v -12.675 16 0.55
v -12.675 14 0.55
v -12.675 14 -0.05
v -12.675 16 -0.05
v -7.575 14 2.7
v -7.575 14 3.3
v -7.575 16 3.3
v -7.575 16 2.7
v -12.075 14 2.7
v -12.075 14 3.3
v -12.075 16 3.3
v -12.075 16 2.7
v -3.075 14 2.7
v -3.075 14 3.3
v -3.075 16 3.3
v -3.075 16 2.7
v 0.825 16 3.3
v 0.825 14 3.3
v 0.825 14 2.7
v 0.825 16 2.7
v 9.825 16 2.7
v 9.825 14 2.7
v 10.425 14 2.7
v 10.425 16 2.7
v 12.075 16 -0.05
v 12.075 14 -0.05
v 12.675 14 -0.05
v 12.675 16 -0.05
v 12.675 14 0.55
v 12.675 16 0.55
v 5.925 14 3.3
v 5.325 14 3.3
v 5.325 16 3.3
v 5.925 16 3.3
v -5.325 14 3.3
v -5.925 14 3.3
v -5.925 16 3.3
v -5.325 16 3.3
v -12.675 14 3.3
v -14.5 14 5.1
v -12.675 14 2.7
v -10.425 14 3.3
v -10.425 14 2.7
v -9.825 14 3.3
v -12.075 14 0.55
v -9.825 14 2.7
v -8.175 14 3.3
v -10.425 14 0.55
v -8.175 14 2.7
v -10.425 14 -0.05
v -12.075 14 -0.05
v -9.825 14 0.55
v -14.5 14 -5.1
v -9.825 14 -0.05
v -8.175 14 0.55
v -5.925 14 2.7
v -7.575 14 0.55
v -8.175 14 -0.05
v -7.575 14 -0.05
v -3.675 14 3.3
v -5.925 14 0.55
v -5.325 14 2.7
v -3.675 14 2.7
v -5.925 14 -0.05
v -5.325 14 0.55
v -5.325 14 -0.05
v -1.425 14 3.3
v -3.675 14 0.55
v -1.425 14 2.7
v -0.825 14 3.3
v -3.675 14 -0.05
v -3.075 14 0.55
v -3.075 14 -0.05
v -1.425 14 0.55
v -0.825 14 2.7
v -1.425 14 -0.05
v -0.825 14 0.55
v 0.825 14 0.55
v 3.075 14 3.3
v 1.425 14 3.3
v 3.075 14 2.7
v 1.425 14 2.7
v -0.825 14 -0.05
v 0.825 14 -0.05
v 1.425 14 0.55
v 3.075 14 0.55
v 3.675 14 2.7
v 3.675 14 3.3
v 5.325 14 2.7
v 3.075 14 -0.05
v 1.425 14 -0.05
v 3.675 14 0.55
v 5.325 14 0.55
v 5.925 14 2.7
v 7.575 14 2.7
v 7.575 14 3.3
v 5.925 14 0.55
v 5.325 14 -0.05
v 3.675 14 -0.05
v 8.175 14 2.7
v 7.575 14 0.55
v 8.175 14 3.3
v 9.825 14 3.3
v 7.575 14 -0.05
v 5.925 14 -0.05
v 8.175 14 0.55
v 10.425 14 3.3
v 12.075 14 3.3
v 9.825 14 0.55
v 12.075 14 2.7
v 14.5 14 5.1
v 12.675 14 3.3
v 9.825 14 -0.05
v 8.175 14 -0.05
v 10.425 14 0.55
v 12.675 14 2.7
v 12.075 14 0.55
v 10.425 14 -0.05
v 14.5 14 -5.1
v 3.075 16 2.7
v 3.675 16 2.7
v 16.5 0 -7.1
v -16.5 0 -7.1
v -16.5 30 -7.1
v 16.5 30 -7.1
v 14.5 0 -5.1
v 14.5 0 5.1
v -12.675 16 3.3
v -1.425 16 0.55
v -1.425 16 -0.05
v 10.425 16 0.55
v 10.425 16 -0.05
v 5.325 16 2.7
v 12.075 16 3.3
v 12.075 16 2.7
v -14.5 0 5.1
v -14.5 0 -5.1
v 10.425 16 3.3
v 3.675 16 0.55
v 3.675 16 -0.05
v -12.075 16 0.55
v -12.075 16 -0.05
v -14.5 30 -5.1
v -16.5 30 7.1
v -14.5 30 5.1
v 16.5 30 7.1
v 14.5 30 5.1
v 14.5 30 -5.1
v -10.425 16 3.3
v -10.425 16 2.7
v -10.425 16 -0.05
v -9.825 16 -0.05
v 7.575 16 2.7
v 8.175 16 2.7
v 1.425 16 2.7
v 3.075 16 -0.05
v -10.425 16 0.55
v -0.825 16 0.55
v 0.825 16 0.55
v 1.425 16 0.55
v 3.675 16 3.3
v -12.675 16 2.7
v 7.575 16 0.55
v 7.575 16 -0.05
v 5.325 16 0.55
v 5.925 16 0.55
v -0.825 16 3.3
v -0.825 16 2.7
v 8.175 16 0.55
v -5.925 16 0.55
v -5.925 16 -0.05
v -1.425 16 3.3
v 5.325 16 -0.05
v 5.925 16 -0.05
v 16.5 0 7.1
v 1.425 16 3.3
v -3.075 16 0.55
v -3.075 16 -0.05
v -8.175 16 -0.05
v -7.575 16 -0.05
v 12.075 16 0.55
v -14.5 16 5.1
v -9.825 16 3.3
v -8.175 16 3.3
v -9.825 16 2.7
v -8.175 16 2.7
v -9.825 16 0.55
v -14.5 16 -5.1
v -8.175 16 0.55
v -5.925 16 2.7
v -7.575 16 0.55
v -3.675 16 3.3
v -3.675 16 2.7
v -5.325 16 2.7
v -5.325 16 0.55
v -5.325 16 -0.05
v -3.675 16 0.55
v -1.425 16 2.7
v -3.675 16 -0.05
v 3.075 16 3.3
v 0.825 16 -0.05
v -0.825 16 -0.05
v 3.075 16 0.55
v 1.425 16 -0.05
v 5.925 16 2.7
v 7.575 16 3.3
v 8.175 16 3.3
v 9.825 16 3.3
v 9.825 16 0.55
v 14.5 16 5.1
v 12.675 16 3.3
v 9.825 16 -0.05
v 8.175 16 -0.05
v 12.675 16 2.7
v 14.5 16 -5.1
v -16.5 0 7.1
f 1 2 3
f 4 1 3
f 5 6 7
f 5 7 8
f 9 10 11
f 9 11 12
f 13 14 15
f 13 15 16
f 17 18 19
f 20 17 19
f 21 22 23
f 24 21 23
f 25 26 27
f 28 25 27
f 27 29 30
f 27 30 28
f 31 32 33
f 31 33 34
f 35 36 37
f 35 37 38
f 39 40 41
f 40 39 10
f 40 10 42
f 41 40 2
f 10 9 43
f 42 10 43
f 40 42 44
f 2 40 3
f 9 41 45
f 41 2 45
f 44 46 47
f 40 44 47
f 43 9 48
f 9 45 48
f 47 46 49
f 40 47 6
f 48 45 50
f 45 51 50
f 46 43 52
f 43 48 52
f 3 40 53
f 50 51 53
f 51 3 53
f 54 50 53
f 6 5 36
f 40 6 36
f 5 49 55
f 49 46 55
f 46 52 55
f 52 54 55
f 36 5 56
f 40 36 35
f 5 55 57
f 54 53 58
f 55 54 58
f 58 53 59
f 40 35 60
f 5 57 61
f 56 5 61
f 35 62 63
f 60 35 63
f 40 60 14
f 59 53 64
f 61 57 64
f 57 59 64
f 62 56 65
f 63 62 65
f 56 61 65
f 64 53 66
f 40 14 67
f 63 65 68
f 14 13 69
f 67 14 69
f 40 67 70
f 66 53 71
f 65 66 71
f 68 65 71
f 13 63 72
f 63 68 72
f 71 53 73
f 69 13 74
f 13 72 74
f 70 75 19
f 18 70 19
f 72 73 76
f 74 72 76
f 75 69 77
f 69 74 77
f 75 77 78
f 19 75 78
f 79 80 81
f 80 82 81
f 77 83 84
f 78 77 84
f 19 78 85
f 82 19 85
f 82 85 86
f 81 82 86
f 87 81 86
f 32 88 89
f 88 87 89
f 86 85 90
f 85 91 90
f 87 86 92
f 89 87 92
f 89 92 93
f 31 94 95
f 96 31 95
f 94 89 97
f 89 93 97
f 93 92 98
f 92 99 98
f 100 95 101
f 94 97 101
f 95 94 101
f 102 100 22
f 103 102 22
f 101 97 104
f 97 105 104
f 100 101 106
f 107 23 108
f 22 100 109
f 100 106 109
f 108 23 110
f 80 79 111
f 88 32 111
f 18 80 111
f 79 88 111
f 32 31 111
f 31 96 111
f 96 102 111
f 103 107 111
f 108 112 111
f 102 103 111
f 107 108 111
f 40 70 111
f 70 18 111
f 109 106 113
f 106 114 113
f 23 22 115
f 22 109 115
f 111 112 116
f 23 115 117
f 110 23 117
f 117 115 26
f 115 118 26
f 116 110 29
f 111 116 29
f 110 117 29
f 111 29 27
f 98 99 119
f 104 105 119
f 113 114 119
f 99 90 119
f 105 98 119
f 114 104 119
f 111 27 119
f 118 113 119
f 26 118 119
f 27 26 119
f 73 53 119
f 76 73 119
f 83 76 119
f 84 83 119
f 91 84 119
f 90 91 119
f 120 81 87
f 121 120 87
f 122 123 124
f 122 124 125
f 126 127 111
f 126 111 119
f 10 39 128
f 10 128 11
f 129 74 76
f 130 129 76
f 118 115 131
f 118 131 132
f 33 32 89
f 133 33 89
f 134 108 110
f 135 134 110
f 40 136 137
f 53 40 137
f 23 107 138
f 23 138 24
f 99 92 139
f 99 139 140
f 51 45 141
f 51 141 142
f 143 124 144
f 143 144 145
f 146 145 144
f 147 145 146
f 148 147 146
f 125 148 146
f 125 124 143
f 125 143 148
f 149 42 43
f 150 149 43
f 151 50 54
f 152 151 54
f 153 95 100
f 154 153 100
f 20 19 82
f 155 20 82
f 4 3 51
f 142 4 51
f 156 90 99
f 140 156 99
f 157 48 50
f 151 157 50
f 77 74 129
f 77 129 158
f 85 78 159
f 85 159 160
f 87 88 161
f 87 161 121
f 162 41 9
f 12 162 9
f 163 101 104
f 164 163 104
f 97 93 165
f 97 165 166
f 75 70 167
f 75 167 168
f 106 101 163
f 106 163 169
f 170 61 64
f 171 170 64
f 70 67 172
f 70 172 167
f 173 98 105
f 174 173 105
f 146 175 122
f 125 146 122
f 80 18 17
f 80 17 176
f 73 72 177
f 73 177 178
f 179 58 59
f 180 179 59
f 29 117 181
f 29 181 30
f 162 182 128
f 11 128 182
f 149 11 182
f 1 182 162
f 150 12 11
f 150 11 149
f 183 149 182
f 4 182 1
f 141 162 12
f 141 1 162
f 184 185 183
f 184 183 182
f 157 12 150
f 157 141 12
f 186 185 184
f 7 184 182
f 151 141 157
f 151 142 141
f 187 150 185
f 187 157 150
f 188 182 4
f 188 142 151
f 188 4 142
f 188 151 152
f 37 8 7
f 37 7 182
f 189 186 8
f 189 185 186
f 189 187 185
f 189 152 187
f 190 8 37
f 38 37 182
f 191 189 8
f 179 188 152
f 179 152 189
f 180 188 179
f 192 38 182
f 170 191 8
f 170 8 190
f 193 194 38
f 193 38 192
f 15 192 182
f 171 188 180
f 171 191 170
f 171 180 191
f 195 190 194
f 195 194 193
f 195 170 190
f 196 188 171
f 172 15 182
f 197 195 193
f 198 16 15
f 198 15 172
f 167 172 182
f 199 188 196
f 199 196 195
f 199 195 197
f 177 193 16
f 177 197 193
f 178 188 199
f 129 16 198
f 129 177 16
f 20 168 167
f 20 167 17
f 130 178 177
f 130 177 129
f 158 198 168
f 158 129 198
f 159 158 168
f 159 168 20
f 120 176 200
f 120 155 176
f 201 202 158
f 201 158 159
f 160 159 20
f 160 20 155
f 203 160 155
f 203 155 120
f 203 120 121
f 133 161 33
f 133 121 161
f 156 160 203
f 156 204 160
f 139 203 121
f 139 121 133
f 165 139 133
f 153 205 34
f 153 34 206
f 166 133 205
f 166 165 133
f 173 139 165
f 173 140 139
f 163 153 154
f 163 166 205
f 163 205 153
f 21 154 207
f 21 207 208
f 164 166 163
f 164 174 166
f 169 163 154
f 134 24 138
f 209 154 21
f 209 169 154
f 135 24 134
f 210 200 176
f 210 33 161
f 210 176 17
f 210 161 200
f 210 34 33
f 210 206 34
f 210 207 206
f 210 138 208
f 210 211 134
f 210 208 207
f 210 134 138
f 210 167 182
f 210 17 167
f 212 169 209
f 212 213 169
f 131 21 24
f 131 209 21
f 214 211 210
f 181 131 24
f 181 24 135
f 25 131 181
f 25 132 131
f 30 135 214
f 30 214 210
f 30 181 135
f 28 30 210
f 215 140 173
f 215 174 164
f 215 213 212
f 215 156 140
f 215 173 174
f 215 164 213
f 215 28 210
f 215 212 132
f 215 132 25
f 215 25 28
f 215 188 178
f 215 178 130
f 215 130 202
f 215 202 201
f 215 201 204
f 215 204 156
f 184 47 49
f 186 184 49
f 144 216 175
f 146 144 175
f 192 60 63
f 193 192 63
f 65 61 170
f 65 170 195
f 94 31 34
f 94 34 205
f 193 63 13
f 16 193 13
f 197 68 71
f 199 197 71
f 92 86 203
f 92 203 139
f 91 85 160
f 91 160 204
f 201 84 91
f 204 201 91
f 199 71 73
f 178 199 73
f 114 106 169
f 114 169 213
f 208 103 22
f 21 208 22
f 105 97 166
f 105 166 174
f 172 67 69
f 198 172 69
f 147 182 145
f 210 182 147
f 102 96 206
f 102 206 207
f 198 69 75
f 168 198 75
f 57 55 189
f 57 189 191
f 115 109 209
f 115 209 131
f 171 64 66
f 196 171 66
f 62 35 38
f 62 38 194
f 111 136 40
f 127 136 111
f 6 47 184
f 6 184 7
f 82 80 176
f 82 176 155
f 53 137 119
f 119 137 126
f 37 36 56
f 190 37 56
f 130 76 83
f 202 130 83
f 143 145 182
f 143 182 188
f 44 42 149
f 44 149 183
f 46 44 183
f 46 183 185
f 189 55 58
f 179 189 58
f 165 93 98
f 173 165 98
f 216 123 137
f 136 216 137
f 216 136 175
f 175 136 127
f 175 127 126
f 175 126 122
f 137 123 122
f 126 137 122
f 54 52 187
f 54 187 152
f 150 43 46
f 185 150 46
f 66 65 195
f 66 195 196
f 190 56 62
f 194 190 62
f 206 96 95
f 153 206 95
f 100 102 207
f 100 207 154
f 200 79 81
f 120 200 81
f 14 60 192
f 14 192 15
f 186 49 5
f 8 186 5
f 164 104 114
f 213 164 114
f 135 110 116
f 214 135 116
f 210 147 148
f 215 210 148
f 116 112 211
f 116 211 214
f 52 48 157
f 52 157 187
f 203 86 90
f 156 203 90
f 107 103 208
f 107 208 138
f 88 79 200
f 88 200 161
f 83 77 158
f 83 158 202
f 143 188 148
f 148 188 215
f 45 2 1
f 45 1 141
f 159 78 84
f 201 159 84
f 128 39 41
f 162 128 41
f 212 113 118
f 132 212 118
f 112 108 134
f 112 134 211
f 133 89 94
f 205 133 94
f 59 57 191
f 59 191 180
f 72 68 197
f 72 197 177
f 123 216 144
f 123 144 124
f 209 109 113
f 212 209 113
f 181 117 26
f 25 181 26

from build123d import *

# Parameters (mm, degrees)
SKETCH1_W               = 33
SKETCH1_H               = 14.2
SKETCH1_W_2             = 29
SKETCH1_H_2             = 10.2
BOSS_EXTRUDE1_DEPTH     = 30
BOSS_EXTRUDE2_START     = -14
SKETCH4_W               = 29
SKETCH4_H               = 10.2
BOSS_EXTRUDE2_DEPTH     = 2
CUT_EXTRUDE1_DEPTH      = 25.055352835
CUT_EXTRUDE1_DEPTH_BACK = 25.055352835
SKETCH5_W               = 0.6
SKETCH5_H               = 0.6


with BuildPart() as part:
    # Sketch1 → Boss-Extrude1 (new body)
    with BuildSketch(Plane(origin=(0, 0, 0), x_dir=(1, 0, 0), z_dir=(0, 1, 0))):
        Rectangle(SKETCH1_W, SKETCH1_H)
        Rectangle(SKETCH1_W_2, SKETCH1_H_2, mode=Mode.SUBTRACT)
    extrude(amount=BOSS_EXTRUDE1_DEPTH)

    # Sketch4 → Boss-Extrude2 (add)
    with BuildSketch(Plane(origin=(0, 30, 0), x_dir=(1, 0, 0), z_dir=(0, 1, 0)).offset(BOSS_EXTRUDE2_START)):
        Rectangle(SKETCH4_W, SKETCH4_H)
    extrude(amount=-BOSS_EXTRUDE2_DEPTH)

    # Sketch5 → Cut-Extrude1 (cut, two sides: drawn at the far end of the back side and taken through both)
    with BuildSketch(Plane(origin=(0, 16, 0), x_dir=(1, 0, 0), z_dir=(0, 1, 0)).offset(-CUT_EXTRUDE1_DEPTH_BACK)):
        with Locations((-10.125, -0.25)):
            Rectangle(SKETCH5_W, SKETCH5_H)
        with Locations((-12.375, -3)):
            Rectangle(SKETCH5_W, SKETCH5_H)
        with Locations((-12.375, -0.25)):
            Rectangle(SKETCH5_W, SKETCH5_H)
        with Locations((-10.125, -3)):
            Rectangle(SKETCH5_W, SKETCH5_H)
        with Locations((-7.875, -0.25)):
            Rectangle(SKETCH5_W, SKETCH5_H)
        with Locations((-7.875, -3)):
            Rectangle(SKETCH5_W, SKETCH5_H)
        with Locations((-5.625, -0.25)):
            Rectangle(SKETCH5_W, SKETCH5_H)
        with Locations((-5.625, -3)):
            Rectangle(SKETCH5_W, SKETCH5_H)
        with Locations((-3.375, -0.25)):
            Rectangle(SKETCH5_W, SKETCH5_H)
        with Locations((-3.375, -3)):
            Rectangle(SKETCH5_W, SKETCH5_H)
        with Locations((-1.125, -0.25)):
            Rectangle(SKETCH5_W, SKETCH5_H)
        with Locations((-1.125, -3)):
            Rectangle(SKETCH5_W, SKETCH5_H)
        with Locations((1.125, -0.25)):
            Rectangle(SKETCH5_W, SKETCH5_H)
        with Locations((1.125, -3)):
            Rectangle(SKETCH5_W, SKETCH5_H)
        with Locations((3.375, -0.25)):
            Rectangle(SKETCH5_W, SKETCH5_H)
        with Locations((3.375, -3)):
            Rectangle(SKETCH5_W, SKETCH5_H)
        with Locations((5.625, -0.25)):
            Rectangle(SKETCH5_W, SKETCH5_H)
        with Locations((5.625, -3)):
            Rectangle(SKETCH5_W, SKETCH5_H)
        with Locations((7.875, -0.25)):
            Rectangle(SKETCH5_W, SKETCH5_H)
        with Locations((7.875, -3)):
            Rectangle(SKETCH5_W, SKETCH5_H)
        with Locations((10.125, -0.25)):
            Rectangle(SKETCH5_W, SKETCH5_H)
        with Locations((10.125, -3)):
            Rectangle(SKETCH5_W, SKETCH5_H)
        with Locations((12.375, -0.25)):
            Rectangle(SKETCH5_W, SKETCH5_H)
        with Locations((12.375, -3)):
            Rectangle(SKETCH5_W, SKETCH5_H)
    extrude(amount=CUT_EXTRUDE1_DEPTH + CUT_EXTRUDE1_DEPTH_BACK, mode=Mode.SUBTRACT)


solid = part.part
